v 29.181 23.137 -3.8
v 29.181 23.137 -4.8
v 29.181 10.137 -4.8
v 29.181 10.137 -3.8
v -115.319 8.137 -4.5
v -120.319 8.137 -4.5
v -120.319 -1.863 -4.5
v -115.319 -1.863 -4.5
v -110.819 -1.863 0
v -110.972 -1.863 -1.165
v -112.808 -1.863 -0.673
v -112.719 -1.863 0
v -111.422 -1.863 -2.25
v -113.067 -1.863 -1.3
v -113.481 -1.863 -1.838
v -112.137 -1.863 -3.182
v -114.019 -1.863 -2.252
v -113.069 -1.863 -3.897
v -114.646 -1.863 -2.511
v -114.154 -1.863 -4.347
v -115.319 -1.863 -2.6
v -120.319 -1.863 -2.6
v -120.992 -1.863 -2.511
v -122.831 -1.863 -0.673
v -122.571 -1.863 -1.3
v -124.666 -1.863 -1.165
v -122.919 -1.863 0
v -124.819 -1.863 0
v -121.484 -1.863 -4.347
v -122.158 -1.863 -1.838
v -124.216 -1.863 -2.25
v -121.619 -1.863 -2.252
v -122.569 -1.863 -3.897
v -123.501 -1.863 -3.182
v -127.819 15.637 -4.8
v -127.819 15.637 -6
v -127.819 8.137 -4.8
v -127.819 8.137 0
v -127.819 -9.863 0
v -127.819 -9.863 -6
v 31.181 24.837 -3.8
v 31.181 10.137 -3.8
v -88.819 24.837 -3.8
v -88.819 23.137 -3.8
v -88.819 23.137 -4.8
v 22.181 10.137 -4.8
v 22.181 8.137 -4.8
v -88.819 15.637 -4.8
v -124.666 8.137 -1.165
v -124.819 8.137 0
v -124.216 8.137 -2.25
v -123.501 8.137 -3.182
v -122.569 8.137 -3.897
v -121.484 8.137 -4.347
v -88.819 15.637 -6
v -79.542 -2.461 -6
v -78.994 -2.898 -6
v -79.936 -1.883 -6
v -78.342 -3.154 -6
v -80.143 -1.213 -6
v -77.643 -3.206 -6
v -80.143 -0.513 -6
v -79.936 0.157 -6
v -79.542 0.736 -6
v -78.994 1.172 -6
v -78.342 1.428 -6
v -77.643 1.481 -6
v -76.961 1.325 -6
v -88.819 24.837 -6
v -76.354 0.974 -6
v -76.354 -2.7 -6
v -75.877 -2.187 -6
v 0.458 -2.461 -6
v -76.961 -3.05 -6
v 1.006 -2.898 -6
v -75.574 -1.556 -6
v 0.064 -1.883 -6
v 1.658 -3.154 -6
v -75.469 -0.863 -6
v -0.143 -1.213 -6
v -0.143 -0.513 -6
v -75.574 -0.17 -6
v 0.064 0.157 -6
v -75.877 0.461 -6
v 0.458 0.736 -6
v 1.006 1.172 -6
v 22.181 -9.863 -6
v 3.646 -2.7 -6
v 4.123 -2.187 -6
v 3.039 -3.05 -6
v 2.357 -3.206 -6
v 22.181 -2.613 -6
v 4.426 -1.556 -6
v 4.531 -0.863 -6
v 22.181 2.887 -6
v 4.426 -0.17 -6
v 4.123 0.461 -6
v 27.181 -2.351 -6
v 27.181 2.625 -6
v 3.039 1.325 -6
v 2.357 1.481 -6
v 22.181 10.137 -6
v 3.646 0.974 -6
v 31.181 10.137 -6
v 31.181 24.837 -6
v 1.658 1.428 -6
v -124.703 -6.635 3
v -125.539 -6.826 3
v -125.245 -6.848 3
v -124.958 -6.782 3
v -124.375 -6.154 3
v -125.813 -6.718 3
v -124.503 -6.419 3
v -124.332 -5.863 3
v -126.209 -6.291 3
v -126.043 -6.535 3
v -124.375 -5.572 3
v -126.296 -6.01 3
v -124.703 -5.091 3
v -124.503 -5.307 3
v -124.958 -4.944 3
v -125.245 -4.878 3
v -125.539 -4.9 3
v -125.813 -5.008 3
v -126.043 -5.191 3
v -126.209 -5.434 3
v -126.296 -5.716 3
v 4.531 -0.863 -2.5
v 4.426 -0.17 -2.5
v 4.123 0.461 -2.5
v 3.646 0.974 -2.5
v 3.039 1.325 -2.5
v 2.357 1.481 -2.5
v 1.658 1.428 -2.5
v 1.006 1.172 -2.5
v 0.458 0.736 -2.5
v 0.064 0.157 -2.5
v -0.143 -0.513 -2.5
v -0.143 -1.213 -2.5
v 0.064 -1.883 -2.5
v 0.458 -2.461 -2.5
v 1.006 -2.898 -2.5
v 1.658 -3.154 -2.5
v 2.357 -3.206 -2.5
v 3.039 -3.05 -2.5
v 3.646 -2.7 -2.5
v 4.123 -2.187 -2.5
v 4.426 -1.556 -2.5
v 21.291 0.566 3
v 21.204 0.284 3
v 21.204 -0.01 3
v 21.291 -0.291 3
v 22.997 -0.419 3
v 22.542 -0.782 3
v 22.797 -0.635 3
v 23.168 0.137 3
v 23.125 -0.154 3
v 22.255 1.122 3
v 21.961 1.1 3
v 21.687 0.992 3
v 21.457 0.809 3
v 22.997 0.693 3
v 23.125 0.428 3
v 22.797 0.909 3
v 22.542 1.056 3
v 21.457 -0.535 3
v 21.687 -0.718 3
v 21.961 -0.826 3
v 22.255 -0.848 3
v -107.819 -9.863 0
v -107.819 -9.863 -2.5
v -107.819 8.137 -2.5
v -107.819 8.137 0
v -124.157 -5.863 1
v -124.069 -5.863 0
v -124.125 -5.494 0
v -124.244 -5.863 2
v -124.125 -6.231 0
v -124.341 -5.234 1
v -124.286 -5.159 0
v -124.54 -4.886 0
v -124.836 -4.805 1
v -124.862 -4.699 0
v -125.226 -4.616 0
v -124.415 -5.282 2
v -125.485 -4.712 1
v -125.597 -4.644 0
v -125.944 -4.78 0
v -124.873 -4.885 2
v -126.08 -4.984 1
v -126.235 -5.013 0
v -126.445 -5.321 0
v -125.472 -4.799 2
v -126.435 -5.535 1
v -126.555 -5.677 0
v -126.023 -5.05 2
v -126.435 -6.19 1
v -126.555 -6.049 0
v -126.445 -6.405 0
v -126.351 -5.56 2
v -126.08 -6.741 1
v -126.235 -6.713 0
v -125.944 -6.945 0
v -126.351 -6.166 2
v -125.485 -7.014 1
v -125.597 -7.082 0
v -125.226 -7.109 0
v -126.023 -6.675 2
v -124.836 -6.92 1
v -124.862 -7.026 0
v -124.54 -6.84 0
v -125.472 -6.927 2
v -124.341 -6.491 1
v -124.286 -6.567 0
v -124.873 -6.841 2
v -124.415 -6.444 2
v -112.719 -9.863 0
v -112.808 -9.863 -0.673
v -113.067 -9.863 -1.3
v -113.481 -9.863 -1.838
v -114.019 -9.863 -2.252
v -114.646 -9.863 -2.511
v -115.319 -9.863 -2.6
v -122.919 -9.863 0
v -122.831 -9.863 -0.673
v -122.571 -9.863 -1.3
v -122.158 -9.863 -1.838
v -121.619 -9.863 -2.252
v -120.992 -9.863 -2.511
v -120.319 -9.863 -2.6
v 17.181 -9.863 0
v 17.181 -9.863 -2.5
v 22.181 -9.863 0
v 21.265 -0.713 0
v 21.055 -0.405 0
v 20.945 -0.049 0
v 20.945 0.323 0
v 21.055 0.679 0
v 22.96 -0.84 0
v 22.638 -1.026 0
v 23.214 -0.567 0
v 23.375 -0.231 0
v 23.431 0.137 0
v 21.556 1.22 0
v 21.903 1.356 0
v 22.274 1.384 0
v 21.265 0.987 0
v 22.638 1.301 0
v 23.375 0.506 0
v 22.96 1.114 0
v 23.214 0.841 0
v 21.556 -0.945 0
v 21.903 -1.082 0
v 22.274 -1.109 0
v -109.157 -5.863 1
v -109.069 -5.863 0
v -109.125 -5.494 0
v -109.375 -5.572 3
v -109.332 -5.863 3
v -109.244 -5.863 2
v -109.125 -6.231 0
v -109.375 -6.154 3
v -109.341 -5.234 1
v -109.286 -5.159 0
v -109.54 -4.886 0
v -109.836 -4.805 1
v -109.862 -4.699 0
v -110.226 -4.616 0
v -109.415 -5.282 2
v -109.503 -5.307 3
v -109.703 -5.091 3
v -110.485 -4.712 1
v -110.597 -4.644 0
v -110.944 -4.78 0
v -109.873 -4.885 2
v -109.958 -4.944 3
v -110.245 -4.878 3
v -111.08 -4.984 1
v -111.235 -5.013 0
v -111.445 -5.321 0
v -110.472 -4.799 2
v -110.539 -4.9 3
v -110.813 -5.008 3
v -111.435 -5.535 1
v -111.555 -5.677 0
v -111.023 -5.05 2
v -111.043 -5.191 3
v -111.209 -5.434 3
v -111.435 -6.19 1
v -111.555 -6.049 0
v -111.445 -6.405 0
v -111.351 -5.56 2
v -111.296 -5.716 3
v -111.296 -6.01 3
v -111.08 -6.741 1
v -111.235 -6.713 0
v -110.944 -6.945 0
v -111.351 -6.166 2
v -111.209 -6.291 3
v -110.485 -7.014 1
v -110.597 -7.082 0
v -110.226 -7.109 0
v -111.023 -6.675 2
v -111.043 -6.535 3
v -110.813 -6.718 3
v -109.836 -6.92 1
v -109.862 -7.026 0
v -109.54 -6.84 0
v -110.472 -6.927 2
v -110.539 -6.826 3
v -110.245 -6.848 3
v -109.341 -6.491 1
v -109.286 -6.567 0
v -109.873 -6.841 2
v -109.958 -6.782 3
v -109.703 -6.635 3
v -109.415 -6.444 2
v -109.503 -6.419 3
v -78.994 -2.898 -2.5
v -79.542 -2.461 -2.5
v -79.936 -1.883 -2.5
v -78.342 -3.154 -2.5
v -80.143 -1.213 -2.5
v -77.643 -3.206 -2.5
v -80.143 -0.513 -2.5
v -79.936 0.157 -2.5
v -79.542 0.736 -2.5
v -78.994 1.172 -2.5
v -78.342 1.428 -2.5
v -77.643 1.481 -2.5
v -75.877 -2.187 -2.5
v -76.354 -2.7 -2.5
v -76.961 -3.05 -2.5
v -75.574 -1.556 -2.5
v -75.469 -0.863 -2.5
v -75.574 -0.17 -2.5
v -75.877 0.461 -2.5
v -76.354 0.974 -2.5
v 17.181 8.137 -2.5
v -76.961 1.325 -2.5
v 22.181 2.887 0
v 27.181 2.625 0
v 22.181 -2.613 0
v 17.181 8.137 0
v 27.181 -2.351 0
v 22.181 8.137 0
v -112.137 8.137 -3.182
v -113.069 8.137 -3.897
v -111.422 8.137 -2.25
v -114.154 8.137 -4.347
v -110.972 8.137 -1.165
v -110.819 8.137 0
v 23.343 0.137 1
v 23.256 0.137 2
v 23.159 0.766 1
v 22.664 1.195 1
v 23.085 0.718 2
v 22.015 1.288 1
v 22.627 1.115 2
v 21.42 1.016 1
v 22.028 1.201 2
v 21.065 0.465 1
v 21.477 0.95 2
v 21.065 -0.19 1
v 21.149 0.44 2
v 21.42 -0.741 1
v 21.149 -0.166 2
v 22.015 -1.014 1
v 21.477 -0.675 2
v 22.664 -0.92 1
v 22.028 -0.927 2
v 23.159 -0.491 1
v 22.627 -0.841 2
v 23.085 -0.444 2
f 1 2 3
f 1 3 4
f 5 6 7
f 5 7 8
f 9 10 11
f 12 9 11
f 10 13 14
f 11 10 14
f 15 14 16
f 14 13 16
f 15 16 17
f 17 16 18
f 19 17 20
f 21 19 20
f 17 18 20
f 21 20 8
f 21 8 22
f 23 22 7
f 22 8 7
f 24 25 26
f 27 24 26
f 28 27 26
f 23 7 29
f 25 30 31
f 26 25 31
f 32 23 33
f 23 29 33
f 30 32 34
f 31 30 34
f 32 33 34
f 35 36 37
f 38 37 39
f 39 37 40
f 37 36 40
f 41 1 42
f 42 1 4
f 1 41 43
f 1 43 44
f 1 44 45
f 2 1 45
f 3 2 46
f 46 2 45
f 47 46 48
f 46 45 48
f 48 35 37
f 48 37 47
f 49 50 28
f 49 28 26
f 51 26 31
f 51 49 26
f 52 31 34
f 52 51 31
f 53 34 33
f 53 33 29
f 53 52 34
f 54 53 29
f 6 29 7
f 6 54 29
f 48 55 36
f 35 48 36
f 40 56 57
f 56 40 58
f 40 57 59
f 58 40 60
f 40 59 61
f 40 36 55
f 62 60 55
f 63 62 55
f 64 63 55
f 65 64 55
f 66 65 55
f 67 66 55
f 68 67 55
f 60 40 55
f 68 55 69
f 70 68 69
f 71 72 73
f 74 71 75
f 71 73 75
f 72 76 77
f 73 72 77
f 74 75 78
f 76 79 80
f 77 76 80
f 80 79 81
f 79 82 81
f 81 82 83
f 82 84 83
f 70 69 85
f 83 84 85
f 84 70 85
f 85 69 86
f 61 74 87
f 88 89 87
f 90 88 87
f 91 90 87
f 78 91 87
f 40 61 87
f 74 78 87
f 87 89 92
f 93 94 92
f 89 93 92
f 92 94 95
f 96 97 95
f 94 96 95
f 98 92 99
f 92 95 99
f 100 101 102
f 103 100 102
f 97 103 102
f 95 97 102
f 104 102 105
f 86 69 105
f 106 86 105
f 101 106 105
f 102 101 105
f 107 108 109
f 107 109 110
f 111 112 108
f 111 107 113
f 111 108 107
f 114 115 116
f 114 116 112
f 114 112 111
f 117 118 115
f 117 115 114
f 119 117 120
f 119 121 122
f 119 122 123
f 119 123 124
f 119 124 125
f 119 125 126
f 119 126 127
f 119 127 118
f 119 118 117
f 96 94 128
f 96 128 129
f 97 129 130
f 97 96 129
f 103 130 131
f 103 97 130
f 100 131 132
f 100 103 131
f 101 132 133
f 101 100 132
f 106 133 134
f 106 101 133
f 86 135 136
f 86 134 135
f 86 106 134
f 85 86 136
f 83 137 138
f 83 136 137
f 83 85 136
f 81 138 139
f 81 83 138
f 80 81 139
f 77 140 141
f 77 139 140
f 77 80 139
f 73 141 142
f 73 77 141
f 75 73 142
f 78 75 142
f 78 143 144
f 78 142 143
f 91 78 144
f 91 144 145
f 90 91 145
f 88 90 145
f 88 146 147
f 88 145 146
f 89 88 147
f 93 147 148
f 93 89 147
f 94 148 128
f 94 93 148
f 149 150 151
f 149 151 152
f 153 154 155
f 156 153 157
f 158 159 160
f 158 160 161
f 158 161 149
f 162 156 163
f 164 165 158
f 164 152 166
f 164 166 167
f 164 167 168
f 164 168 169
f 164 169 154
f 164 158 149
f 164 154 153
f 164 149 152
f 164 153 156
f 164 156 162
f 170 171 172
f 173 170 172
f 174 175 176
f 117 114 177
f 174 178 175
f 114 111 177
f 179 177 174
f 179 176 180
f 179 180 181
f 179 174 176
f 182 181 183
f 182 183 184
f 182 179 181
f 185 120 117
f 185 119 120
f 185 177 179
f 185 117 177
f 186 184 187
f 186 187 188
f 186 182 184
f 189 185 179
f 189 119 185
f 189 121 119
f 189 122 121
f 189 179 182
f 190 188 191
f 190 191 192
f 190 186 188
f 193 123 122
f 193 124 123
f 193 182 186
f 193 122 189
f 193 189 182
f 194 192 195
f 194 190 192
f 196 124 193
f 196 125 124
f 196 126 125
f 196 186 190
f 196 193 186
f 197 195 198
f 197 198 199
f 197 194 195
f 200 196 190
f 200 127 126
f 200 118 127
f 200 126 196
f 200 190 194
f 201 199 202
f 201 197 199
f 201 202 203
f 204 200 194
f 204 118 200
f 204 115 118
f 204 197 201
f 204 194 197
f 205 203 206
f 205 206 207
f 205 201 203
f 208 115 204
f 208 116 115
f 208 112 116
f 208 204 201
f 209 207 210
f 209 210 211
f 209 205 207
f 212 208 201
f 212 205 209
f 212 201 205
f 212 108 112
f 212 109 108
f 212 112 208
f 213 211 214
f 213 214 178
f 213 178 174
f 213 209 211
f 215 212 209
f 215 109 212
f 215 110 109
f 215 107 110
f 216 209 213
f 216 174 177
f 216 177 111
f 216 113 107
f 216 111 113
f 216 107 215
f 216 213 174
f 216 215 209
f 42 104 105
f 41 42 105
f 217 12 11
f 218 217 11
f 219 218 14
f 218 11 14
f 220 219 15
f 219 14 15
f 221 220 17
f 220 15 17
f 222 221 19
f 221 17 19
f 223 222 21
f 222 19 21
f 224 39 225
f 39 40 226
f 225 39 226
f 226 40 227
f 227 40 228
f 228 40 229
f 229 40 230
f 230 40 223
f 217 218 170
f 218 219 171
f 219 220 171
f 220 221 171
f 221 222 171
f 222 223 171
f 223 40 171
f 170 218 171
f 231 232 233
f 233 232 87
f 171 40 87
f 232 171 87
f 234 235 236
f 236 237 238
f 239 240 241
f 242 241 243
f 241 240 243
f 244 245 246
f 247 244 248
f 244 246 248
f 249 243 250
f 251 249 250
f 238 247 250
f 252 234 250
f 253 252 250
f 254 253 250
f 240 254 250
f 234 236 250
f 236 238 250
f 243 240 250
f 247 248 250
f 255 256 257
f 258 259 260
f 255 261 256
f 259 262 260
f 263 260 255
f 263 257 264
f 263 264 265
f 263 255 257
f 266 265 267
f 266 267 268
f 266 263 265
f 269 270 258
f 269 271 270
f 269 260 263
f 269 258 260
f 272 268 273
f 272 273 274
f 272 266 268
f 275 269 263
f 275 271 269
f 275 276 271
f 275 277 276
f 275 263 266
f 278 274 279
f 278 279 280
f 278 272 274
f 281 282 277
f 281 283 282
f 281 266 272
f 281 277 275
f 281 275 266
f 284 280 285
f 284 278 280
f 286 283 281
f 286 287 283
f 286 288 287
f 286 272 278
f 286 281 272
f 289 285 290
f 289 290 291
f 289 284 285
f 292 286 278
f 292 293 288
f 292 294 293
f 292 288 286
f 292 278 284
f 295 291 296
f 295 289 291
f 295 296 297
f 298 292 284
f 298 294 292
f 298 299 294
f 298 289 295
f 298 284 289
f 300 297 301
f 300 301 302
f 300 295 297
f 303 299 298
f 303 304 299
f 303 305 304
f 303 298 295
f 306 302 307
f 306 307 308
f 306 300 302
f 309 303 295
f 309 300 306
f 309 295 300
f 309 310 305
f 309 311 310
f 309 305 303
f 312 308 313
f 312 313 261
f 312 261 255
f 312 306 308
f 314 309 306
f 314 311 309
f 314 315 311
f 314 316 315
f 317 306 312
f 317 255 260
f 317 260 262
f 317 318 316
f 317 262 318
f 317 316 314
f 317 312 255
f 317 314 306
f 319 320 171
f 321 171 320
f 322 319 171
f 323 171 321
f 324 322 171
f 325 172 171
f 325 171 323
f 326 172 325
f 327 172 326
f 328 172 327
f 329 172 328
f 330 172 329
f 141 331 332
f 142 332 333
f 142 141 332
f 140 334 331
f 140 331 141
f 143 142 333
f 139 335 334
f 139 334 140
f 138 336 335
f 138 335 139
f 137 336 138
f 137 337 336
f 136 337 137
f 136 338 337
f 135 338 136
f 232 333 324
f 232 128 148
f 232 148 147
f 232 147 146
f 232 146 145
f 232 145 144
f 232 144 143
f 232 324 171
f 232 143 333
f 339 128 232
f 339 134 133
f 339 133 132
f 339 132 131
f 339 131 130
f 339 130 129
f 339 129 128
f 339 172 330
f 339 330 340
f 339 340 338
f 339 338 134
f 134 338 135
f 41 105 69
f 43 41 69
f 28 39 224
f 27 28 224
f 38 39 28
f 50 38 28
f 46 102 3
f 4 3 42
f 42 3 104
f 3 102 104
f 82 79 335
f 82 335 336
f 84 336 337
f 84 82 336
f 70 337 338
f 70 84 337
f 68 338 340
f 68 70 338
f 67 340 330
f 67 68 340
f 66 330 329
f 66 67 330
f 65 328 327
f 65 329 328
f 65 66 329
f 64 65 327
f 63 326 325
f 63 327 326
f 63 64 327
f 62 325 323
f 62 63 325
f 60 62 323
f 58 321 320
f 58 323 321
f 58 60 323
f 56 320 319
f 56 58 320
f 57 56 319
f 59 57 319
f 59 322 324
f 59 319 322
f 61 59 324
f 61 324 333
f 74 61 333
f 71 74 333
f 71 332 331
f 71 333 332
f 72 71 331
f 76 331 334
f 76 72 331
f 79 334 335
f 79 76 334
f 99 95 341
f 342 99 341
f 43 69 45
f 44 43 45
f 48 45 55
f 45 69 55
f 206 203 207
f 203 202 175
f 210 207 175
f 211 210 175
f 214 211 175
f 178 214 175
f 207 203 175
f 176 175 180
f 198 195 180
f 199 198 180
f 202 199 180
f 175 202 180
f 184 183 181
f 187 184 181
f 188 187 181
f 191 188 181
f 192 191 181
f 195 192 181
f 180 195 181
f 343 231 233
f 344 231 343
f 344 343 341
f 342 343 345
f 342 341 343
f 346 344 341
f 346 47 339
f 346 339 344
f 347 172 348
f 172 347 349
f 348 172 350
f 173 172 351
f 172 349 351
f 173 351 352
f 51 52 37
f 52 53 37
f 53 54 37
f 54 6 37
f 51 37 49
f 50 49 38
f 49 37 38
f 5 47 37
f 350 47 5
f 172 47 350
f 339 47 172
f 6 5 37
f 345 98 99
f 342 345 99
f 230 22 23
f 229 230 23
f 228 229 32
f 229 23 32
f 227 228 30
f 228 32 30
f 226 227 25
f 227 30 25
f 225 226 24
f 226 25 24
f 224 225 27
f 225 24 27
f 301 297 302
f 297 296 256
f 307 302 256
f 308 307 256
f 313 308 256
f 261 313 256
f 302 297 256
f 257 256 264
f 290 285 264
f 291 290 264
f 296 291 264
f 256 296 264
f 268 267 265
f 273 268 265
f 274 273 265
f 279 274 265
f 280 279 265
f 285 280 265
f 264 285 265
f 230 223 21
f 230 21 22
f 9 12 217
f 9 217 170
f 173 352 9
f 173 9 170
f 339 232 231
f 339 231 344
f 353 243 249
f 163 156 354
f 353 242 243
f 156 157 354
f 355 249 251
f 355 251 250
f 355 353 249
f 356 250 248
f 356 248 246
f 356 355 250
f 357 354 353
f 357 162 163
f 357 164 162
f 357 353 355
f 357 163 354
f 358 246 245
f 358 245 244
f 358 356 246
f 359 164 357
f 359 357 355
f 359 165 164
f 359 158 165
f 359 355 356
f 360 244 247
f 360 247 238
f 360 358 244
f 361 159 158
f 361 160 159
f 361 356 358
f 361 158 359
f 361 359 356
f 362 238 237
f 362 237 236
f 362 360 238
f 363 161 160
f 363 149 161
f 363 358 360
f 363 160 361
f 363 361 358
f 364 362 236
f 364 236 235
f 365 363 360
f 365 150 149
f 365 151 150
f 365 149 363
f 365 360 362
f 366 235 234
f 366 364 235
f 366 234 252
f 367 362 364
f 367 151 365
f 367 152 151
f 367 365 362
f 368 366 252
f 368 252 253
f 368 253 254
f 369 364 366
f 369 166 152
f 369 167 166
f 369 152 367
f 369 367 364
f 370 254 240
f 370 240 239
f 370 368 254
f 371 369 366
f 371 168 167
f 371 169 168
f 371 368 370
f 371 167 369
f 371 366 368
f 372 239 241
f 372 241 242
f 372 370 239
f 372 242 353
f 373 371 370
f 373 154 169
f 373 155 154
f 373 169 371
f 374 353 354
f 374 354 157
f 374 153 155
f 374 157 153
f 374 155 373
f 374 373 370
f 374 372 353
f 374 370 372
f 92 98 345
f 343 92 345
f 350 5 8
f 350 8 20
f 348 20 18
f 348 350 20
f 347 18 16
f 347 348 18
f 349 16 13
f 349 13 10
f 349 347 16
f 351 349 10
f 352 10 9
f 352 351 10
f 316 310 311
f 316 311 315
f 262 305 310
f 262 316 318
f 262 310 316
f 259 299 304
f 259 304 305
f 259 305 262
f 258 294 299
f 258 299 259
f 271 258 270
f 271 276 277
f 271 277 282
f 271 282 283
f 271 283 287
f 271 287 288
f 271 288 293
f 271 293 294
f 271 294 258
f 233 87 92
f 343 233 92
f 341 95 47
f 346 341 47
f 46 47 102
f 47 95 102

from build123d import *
from OCP.BRepFilletAPI import BRepFilletAPI_MakeChamfer

# Parameters (mm, degrees)
BOSS_EXTRUDE1_DEPTH      = 6
BOSS_EXTRUDE1_DEPTH_BACK = 6
CUT_EXTRUDE1_DEPTH       = 157
CUT_EXTRUDE4_DEPTH       = 2.5
CUT_EXTRUDE4_DEPTH_BACK  = 2.5
SKETCH8_W                = 125
SKETCH8_H                = 34.7
CUT_EXTRUDE5_DEPTH       = 131.348014108
CUT_EXTRUDE5_DEPTH_BACK  = 131.348014108
SKETCH9_R                = 2.35
CHAMFER2_SIZE            = 5
CHAMFER2_SIZE_2          = 0.262038896
CUT_EXTRUDE8_DEPTH       = 10
CUT_EXTRUDE9_DEPTH       = 131.715773363
SKETCH16_W               = 214.344642296
SKETCH16_H               = 84.645654919
CUT_EXTRUDE10_DEPTH      = 131.348014108
SKETCH17_W               = 2
SKETCH17_H               = 14.7
CUT_EXTRUDE11_DEPTH      = 3.8
SKETCH19_R               = 1.25
BOSS_EXTRUDE5_DEPTH      = 3
BOSS_EXTRUDE5_2_DEPTH    = 3
BOSS_EXTRUDE5_3_DEPTH    = 3
CHAMFER3_SIZE            = 3
CHAMFER3_SIZE_2          = 0.262465991
CHAMFER4_SIZE            = 3
CHAMFER4_SIZE_2          = 0.262465991
CHAMFER5_SIZE            = 3
CHAMFER5_SIZE_2          = 0.262465991


# Some blends are built 0.0001 mm under size
with BuildPart() as part:
    # Sketch1 → Boss-Extrude1 (new, two sides: drawn at the far end of the back side and taken through both)
    with BuildSketch(Plane.XY.offset(-BOSS_EXTRUDE1_DEPTH_BACK)):
        Polygon((-127.819104229, -9.862903226), (22.180895771, -9.862903226), (22.180895771, -2.612903226), (27.180895771, -2.612903226), (27.180895771, 2.887096774), (22.180895771, 2.887096774), (22.180895771, 10.137096774), (31.180895771, 10.137096774), (31.180895771, 23.637096774), (31.180895771, 24.837096774), (-88.819104229, 24.837096774), (-88.819104229, 23.637096774), (-88.819104229, 15.637096774), (-127.819104229, 15.637096774), align=None)
    extrude(amount=BOSS_EXTRUDE1_DEPTH + BOSS_EXTRUDE1_DEPTH_BACK)

    # Sketch2 → Cut-Extrude1 (cut)
    with BuildSketch(Plane.ZY.offset(127.819104229)):
        Polygon((-4.8, 23.137096774), (-4.8, 8.137096774), (4.8, 8.137096774), (4.8, 23.137096774), (3.8, 23.137096774), (3.8, 24.837096774), (-3.8, 24.837096774), (-3.8, 23.137096774), align=None)
    extrude(amount=-CUT_EXTRUDE1_DEPTH, mode=Mode.SUBTRACT)

    # Sketch8 → Cut-Extrude4 (cut, two sides: drawn at the far end of the back side and taken through both)
    with BuildSketch(Plane.XY.offset(-CUT_EXTRUDE4_DEPTH_BACK)):
        with Locations((-45.319104229, 7.487096774)):
            Rectangle(SKETCH8_W, SKETCH8_H)
    extrude(amount=CUT_EXTRUDE4_DEPTH + CUT_EXTRUDE4_DEPTH_BACK, mode=Mode.SUBTRACT)

    # Sketch9 → Cut-Extrude5 (cut, two sides: drawn at the far end of the back side and taken through both)
    with BuildSketch(Plane.XY.offset(-CUT_EXTRUDE5_DEPTH_BACK)):
        with Locations((-77.819104229, -0.862903226)):
            Circle(SKETCH9_R)
        with Locations((2.180895771, -0.862903226)):
            Circle(SKETCH9_R)
    extrude(amount=CUT_EXTRUDE5_DEPTH + CUT_EXTRUDE5_DEPTH_BACK, mode=Mode.SUBTRACT)

    # Chamfer2
    chamfer2_edges_1 = [part.edges().sort_by_distance(p)[0] for p in [
        (27.180895771, -2.612903226, 0),
    ]]
    chamfer2_side_1 = [part.faces().sort_by_distance(p)[0] for p in [
        (27.175654993, -2.612903226, 0),
    ]]
    chamfer2_edges_2 = [part.edges().sort_by_distance(p)[0] for p in [
        (27.180895771, 2.887096774, 0),
    ]]
    chamfer2_side_2 = [part.faces().sort_by_distance(p)[0] for p in [
        (27.180895771, 2.881855996, 0),
    ]]
    chamfer2 = BRepFilletAPI_MakeChamfer(part.part.solid().wrapped)
    for e in chamfer2_edges_1:
        chamfer2.Add(CHAMFER2_SIZE - 0.0001, CHAMFER2_SIZE_2 - 0.0001, e.wrapped, chamfer2_side_1[0].wrapped)
    for e in chamfer2_edges_2:
        chamfer2.Add(CHAMFER2_SIZE_2 - 0.0001, CHAMFER2_SIZE - 0.0001, e.wrapped, chamfer2_side_2[0].wrapped)
    add(Compound.cast(chamfer2.Shape()), mode=Mode.REPLACE)  # a hair under: the kernel refuses the full size

    # Sketch14 → Cut-Extrude8 (cut)
    with BuildSketch(Plane(origin=(0, 8.137096774, 0), x_dir=(1, 0, 0), z_dir=(0, 1, 0))):
        with BuildLine():
            Line((-120.319104229, 4.5), (-115.319104229, 4.5))
            ThreePointArc((-115.319104229, 4.5), (-110.819104229, 0), (-115.319104229, -4.5))
            Line((-115.319104229, -4.5), (-120.319104229, -4.5))
            ThreePointArc((-120.319104229, -4.5), (-124.819104229, 0), (-120.319104229, 4.5))
        make_face()
    extrude(amount=-CUT_EXTRUDE8_DEPTH, mode=Mode.SUBTRACT)

    # Sketch15 → Cut-Extrude9 (cut, through all)
    with BuildSketch(Plane(origin=(0, -1.862903226, 0), x_dir=(1, 0, 0), z_dir=(0, 1, 0))):
        with BuildLine():
            Line((-120.319104229, -2.6), (-115.319104229, -2.6))
            ThreePointArc((-115.319104229, -2.6), (-112.719104229, 0), (-115.319104229, 2.6))
            Line((-115.319104229, 2.6), (-120.319104229, 2.6))
            ThreePointArc((-120.319104229, 2.6), (-122.919104229, 0), (-120.319104229, -2.6))
        make_face()
    extrude(amount=-CUT_EXTRUDE9_DEPTH, mode=Mode.SUBTRACT)

    # Sketch16 → Cut-Extrude10 (cut, through all)
    with BuildSketch(Plane.XY):
        with Locations((-30.272765953, 16.776086779)):
            Rectangle(SKETCH16_W, SKETCH16_H)
    extrude(amount=CUT_EXTRUDE10_DEPTH, mode=Mode.SUBTRACT)

    # Sketch17 → Cut-Extrude11 (cut)
    with BuildSketch(Plane.XY):
        with Locations((30.180895771, 17.487096774)):
            Rectangle(SKETCH17_W, SKETCH17_H)
    extrude(amount=-CUT_EXTRUDE11_DEPTH, mode=Mode.SUBTRACT)


with BuildPart() as body_2:
    # Sketch19 → Boss-Extrude5 (new body)
    with BuildSketch(Plane.XY):
        with Locations((-125.319104229, -5.862903226)):
            Circle(SKETCH19_R)
    extrude(amount=BOSS_EXTRUDE5_DEPTH)

    # Chamfer5
    # the kernel refuses this chamfer: 3, 0.262465991 mm, written as the material it takes off along each edge
    with BuildSketch(Plane(origin=(-125.319104229, -5.862903226, 3), x_dir=(1, 0, 0), z_dir=(0, -1, 0))) as chamfer5_piece_1:
        Polygon((1.25, -CHAMFER5_SIZE), (1.25 - CHAMFER5_SIZE_2 * 0.999999998391, 0), (1.25, 0), align=None)
    revolve(axis=Axis((-125.319104229, -5.862903226, 3), (0, 0, 1)), mode=Mode.SUBTRACT)


with BuildPart() as body_3:
    # Sketch19 → Boss-Extrude5 2 (new body)
    with BuildSketch(Plane.XY):
        with Locations((-110.319104229, -5.862903226)):
            Circle(SKETCH19_R)
    extrude(amount=BOSS_EXTRUDE5_2_DEPTH)

    # Chamfer4
    # the kernel refuses this chamfer: 3, 0.262465991 mm, written as the material it takes off along each edge
    with BuildSketch(Plane(origin=(-110.319104229, -5.862903226, 3), x_dir=(1, 0, 0), z_dir=(0, -1, 0))) as chamfer4_piece_1:
        Polygon((1.25, -CHAMFER4_SIZE), (1.25 - CHAMFER4_SIZE_2 * 0.999999998391, 0), (1.25, 0), align=None)
    revolve(axis=Axis((-110.319104229, -5.862903226, 3), (0, 0, 1)), mode=Mode.SUBTRACT)


with BuildPart() as body_4:
    # Sketch19 → Boss-Extrude5 3 (new body)
    with BuildSketch(Plane.XY):
        with Locations((22.180895771, 0.137096774)):
            Circle(SKETCH19_R)
    extrude(amount=BOSS_EXTRUDE5_3_DEPTH)

    # Chamfer3
    # the kernel refuses this chamfer: 3, 0.262465991 mm, written as the material it takes off along each edge
    with BuildSketch(Plane(origin=(22.180895771, 0.137096774, 3), x_dir=(1, 0, 0), z_dir=(0, -1, 0))) as chamfer3_piece_1:
        Polygon((1.25, -CHAMFER3_SIZE), (1.25 - CHAMFER3_SIZE_2 * 0.999999998391, 0), (1.25, 0), align=None)
    revolve(axis=Axis((22.180895771, 0.137096774, 3), (0, 0, 1)), mode=Mode.SUBTRACT)


solid = Compound([part.part, body_2.part, body_3.part, body_4.part])
